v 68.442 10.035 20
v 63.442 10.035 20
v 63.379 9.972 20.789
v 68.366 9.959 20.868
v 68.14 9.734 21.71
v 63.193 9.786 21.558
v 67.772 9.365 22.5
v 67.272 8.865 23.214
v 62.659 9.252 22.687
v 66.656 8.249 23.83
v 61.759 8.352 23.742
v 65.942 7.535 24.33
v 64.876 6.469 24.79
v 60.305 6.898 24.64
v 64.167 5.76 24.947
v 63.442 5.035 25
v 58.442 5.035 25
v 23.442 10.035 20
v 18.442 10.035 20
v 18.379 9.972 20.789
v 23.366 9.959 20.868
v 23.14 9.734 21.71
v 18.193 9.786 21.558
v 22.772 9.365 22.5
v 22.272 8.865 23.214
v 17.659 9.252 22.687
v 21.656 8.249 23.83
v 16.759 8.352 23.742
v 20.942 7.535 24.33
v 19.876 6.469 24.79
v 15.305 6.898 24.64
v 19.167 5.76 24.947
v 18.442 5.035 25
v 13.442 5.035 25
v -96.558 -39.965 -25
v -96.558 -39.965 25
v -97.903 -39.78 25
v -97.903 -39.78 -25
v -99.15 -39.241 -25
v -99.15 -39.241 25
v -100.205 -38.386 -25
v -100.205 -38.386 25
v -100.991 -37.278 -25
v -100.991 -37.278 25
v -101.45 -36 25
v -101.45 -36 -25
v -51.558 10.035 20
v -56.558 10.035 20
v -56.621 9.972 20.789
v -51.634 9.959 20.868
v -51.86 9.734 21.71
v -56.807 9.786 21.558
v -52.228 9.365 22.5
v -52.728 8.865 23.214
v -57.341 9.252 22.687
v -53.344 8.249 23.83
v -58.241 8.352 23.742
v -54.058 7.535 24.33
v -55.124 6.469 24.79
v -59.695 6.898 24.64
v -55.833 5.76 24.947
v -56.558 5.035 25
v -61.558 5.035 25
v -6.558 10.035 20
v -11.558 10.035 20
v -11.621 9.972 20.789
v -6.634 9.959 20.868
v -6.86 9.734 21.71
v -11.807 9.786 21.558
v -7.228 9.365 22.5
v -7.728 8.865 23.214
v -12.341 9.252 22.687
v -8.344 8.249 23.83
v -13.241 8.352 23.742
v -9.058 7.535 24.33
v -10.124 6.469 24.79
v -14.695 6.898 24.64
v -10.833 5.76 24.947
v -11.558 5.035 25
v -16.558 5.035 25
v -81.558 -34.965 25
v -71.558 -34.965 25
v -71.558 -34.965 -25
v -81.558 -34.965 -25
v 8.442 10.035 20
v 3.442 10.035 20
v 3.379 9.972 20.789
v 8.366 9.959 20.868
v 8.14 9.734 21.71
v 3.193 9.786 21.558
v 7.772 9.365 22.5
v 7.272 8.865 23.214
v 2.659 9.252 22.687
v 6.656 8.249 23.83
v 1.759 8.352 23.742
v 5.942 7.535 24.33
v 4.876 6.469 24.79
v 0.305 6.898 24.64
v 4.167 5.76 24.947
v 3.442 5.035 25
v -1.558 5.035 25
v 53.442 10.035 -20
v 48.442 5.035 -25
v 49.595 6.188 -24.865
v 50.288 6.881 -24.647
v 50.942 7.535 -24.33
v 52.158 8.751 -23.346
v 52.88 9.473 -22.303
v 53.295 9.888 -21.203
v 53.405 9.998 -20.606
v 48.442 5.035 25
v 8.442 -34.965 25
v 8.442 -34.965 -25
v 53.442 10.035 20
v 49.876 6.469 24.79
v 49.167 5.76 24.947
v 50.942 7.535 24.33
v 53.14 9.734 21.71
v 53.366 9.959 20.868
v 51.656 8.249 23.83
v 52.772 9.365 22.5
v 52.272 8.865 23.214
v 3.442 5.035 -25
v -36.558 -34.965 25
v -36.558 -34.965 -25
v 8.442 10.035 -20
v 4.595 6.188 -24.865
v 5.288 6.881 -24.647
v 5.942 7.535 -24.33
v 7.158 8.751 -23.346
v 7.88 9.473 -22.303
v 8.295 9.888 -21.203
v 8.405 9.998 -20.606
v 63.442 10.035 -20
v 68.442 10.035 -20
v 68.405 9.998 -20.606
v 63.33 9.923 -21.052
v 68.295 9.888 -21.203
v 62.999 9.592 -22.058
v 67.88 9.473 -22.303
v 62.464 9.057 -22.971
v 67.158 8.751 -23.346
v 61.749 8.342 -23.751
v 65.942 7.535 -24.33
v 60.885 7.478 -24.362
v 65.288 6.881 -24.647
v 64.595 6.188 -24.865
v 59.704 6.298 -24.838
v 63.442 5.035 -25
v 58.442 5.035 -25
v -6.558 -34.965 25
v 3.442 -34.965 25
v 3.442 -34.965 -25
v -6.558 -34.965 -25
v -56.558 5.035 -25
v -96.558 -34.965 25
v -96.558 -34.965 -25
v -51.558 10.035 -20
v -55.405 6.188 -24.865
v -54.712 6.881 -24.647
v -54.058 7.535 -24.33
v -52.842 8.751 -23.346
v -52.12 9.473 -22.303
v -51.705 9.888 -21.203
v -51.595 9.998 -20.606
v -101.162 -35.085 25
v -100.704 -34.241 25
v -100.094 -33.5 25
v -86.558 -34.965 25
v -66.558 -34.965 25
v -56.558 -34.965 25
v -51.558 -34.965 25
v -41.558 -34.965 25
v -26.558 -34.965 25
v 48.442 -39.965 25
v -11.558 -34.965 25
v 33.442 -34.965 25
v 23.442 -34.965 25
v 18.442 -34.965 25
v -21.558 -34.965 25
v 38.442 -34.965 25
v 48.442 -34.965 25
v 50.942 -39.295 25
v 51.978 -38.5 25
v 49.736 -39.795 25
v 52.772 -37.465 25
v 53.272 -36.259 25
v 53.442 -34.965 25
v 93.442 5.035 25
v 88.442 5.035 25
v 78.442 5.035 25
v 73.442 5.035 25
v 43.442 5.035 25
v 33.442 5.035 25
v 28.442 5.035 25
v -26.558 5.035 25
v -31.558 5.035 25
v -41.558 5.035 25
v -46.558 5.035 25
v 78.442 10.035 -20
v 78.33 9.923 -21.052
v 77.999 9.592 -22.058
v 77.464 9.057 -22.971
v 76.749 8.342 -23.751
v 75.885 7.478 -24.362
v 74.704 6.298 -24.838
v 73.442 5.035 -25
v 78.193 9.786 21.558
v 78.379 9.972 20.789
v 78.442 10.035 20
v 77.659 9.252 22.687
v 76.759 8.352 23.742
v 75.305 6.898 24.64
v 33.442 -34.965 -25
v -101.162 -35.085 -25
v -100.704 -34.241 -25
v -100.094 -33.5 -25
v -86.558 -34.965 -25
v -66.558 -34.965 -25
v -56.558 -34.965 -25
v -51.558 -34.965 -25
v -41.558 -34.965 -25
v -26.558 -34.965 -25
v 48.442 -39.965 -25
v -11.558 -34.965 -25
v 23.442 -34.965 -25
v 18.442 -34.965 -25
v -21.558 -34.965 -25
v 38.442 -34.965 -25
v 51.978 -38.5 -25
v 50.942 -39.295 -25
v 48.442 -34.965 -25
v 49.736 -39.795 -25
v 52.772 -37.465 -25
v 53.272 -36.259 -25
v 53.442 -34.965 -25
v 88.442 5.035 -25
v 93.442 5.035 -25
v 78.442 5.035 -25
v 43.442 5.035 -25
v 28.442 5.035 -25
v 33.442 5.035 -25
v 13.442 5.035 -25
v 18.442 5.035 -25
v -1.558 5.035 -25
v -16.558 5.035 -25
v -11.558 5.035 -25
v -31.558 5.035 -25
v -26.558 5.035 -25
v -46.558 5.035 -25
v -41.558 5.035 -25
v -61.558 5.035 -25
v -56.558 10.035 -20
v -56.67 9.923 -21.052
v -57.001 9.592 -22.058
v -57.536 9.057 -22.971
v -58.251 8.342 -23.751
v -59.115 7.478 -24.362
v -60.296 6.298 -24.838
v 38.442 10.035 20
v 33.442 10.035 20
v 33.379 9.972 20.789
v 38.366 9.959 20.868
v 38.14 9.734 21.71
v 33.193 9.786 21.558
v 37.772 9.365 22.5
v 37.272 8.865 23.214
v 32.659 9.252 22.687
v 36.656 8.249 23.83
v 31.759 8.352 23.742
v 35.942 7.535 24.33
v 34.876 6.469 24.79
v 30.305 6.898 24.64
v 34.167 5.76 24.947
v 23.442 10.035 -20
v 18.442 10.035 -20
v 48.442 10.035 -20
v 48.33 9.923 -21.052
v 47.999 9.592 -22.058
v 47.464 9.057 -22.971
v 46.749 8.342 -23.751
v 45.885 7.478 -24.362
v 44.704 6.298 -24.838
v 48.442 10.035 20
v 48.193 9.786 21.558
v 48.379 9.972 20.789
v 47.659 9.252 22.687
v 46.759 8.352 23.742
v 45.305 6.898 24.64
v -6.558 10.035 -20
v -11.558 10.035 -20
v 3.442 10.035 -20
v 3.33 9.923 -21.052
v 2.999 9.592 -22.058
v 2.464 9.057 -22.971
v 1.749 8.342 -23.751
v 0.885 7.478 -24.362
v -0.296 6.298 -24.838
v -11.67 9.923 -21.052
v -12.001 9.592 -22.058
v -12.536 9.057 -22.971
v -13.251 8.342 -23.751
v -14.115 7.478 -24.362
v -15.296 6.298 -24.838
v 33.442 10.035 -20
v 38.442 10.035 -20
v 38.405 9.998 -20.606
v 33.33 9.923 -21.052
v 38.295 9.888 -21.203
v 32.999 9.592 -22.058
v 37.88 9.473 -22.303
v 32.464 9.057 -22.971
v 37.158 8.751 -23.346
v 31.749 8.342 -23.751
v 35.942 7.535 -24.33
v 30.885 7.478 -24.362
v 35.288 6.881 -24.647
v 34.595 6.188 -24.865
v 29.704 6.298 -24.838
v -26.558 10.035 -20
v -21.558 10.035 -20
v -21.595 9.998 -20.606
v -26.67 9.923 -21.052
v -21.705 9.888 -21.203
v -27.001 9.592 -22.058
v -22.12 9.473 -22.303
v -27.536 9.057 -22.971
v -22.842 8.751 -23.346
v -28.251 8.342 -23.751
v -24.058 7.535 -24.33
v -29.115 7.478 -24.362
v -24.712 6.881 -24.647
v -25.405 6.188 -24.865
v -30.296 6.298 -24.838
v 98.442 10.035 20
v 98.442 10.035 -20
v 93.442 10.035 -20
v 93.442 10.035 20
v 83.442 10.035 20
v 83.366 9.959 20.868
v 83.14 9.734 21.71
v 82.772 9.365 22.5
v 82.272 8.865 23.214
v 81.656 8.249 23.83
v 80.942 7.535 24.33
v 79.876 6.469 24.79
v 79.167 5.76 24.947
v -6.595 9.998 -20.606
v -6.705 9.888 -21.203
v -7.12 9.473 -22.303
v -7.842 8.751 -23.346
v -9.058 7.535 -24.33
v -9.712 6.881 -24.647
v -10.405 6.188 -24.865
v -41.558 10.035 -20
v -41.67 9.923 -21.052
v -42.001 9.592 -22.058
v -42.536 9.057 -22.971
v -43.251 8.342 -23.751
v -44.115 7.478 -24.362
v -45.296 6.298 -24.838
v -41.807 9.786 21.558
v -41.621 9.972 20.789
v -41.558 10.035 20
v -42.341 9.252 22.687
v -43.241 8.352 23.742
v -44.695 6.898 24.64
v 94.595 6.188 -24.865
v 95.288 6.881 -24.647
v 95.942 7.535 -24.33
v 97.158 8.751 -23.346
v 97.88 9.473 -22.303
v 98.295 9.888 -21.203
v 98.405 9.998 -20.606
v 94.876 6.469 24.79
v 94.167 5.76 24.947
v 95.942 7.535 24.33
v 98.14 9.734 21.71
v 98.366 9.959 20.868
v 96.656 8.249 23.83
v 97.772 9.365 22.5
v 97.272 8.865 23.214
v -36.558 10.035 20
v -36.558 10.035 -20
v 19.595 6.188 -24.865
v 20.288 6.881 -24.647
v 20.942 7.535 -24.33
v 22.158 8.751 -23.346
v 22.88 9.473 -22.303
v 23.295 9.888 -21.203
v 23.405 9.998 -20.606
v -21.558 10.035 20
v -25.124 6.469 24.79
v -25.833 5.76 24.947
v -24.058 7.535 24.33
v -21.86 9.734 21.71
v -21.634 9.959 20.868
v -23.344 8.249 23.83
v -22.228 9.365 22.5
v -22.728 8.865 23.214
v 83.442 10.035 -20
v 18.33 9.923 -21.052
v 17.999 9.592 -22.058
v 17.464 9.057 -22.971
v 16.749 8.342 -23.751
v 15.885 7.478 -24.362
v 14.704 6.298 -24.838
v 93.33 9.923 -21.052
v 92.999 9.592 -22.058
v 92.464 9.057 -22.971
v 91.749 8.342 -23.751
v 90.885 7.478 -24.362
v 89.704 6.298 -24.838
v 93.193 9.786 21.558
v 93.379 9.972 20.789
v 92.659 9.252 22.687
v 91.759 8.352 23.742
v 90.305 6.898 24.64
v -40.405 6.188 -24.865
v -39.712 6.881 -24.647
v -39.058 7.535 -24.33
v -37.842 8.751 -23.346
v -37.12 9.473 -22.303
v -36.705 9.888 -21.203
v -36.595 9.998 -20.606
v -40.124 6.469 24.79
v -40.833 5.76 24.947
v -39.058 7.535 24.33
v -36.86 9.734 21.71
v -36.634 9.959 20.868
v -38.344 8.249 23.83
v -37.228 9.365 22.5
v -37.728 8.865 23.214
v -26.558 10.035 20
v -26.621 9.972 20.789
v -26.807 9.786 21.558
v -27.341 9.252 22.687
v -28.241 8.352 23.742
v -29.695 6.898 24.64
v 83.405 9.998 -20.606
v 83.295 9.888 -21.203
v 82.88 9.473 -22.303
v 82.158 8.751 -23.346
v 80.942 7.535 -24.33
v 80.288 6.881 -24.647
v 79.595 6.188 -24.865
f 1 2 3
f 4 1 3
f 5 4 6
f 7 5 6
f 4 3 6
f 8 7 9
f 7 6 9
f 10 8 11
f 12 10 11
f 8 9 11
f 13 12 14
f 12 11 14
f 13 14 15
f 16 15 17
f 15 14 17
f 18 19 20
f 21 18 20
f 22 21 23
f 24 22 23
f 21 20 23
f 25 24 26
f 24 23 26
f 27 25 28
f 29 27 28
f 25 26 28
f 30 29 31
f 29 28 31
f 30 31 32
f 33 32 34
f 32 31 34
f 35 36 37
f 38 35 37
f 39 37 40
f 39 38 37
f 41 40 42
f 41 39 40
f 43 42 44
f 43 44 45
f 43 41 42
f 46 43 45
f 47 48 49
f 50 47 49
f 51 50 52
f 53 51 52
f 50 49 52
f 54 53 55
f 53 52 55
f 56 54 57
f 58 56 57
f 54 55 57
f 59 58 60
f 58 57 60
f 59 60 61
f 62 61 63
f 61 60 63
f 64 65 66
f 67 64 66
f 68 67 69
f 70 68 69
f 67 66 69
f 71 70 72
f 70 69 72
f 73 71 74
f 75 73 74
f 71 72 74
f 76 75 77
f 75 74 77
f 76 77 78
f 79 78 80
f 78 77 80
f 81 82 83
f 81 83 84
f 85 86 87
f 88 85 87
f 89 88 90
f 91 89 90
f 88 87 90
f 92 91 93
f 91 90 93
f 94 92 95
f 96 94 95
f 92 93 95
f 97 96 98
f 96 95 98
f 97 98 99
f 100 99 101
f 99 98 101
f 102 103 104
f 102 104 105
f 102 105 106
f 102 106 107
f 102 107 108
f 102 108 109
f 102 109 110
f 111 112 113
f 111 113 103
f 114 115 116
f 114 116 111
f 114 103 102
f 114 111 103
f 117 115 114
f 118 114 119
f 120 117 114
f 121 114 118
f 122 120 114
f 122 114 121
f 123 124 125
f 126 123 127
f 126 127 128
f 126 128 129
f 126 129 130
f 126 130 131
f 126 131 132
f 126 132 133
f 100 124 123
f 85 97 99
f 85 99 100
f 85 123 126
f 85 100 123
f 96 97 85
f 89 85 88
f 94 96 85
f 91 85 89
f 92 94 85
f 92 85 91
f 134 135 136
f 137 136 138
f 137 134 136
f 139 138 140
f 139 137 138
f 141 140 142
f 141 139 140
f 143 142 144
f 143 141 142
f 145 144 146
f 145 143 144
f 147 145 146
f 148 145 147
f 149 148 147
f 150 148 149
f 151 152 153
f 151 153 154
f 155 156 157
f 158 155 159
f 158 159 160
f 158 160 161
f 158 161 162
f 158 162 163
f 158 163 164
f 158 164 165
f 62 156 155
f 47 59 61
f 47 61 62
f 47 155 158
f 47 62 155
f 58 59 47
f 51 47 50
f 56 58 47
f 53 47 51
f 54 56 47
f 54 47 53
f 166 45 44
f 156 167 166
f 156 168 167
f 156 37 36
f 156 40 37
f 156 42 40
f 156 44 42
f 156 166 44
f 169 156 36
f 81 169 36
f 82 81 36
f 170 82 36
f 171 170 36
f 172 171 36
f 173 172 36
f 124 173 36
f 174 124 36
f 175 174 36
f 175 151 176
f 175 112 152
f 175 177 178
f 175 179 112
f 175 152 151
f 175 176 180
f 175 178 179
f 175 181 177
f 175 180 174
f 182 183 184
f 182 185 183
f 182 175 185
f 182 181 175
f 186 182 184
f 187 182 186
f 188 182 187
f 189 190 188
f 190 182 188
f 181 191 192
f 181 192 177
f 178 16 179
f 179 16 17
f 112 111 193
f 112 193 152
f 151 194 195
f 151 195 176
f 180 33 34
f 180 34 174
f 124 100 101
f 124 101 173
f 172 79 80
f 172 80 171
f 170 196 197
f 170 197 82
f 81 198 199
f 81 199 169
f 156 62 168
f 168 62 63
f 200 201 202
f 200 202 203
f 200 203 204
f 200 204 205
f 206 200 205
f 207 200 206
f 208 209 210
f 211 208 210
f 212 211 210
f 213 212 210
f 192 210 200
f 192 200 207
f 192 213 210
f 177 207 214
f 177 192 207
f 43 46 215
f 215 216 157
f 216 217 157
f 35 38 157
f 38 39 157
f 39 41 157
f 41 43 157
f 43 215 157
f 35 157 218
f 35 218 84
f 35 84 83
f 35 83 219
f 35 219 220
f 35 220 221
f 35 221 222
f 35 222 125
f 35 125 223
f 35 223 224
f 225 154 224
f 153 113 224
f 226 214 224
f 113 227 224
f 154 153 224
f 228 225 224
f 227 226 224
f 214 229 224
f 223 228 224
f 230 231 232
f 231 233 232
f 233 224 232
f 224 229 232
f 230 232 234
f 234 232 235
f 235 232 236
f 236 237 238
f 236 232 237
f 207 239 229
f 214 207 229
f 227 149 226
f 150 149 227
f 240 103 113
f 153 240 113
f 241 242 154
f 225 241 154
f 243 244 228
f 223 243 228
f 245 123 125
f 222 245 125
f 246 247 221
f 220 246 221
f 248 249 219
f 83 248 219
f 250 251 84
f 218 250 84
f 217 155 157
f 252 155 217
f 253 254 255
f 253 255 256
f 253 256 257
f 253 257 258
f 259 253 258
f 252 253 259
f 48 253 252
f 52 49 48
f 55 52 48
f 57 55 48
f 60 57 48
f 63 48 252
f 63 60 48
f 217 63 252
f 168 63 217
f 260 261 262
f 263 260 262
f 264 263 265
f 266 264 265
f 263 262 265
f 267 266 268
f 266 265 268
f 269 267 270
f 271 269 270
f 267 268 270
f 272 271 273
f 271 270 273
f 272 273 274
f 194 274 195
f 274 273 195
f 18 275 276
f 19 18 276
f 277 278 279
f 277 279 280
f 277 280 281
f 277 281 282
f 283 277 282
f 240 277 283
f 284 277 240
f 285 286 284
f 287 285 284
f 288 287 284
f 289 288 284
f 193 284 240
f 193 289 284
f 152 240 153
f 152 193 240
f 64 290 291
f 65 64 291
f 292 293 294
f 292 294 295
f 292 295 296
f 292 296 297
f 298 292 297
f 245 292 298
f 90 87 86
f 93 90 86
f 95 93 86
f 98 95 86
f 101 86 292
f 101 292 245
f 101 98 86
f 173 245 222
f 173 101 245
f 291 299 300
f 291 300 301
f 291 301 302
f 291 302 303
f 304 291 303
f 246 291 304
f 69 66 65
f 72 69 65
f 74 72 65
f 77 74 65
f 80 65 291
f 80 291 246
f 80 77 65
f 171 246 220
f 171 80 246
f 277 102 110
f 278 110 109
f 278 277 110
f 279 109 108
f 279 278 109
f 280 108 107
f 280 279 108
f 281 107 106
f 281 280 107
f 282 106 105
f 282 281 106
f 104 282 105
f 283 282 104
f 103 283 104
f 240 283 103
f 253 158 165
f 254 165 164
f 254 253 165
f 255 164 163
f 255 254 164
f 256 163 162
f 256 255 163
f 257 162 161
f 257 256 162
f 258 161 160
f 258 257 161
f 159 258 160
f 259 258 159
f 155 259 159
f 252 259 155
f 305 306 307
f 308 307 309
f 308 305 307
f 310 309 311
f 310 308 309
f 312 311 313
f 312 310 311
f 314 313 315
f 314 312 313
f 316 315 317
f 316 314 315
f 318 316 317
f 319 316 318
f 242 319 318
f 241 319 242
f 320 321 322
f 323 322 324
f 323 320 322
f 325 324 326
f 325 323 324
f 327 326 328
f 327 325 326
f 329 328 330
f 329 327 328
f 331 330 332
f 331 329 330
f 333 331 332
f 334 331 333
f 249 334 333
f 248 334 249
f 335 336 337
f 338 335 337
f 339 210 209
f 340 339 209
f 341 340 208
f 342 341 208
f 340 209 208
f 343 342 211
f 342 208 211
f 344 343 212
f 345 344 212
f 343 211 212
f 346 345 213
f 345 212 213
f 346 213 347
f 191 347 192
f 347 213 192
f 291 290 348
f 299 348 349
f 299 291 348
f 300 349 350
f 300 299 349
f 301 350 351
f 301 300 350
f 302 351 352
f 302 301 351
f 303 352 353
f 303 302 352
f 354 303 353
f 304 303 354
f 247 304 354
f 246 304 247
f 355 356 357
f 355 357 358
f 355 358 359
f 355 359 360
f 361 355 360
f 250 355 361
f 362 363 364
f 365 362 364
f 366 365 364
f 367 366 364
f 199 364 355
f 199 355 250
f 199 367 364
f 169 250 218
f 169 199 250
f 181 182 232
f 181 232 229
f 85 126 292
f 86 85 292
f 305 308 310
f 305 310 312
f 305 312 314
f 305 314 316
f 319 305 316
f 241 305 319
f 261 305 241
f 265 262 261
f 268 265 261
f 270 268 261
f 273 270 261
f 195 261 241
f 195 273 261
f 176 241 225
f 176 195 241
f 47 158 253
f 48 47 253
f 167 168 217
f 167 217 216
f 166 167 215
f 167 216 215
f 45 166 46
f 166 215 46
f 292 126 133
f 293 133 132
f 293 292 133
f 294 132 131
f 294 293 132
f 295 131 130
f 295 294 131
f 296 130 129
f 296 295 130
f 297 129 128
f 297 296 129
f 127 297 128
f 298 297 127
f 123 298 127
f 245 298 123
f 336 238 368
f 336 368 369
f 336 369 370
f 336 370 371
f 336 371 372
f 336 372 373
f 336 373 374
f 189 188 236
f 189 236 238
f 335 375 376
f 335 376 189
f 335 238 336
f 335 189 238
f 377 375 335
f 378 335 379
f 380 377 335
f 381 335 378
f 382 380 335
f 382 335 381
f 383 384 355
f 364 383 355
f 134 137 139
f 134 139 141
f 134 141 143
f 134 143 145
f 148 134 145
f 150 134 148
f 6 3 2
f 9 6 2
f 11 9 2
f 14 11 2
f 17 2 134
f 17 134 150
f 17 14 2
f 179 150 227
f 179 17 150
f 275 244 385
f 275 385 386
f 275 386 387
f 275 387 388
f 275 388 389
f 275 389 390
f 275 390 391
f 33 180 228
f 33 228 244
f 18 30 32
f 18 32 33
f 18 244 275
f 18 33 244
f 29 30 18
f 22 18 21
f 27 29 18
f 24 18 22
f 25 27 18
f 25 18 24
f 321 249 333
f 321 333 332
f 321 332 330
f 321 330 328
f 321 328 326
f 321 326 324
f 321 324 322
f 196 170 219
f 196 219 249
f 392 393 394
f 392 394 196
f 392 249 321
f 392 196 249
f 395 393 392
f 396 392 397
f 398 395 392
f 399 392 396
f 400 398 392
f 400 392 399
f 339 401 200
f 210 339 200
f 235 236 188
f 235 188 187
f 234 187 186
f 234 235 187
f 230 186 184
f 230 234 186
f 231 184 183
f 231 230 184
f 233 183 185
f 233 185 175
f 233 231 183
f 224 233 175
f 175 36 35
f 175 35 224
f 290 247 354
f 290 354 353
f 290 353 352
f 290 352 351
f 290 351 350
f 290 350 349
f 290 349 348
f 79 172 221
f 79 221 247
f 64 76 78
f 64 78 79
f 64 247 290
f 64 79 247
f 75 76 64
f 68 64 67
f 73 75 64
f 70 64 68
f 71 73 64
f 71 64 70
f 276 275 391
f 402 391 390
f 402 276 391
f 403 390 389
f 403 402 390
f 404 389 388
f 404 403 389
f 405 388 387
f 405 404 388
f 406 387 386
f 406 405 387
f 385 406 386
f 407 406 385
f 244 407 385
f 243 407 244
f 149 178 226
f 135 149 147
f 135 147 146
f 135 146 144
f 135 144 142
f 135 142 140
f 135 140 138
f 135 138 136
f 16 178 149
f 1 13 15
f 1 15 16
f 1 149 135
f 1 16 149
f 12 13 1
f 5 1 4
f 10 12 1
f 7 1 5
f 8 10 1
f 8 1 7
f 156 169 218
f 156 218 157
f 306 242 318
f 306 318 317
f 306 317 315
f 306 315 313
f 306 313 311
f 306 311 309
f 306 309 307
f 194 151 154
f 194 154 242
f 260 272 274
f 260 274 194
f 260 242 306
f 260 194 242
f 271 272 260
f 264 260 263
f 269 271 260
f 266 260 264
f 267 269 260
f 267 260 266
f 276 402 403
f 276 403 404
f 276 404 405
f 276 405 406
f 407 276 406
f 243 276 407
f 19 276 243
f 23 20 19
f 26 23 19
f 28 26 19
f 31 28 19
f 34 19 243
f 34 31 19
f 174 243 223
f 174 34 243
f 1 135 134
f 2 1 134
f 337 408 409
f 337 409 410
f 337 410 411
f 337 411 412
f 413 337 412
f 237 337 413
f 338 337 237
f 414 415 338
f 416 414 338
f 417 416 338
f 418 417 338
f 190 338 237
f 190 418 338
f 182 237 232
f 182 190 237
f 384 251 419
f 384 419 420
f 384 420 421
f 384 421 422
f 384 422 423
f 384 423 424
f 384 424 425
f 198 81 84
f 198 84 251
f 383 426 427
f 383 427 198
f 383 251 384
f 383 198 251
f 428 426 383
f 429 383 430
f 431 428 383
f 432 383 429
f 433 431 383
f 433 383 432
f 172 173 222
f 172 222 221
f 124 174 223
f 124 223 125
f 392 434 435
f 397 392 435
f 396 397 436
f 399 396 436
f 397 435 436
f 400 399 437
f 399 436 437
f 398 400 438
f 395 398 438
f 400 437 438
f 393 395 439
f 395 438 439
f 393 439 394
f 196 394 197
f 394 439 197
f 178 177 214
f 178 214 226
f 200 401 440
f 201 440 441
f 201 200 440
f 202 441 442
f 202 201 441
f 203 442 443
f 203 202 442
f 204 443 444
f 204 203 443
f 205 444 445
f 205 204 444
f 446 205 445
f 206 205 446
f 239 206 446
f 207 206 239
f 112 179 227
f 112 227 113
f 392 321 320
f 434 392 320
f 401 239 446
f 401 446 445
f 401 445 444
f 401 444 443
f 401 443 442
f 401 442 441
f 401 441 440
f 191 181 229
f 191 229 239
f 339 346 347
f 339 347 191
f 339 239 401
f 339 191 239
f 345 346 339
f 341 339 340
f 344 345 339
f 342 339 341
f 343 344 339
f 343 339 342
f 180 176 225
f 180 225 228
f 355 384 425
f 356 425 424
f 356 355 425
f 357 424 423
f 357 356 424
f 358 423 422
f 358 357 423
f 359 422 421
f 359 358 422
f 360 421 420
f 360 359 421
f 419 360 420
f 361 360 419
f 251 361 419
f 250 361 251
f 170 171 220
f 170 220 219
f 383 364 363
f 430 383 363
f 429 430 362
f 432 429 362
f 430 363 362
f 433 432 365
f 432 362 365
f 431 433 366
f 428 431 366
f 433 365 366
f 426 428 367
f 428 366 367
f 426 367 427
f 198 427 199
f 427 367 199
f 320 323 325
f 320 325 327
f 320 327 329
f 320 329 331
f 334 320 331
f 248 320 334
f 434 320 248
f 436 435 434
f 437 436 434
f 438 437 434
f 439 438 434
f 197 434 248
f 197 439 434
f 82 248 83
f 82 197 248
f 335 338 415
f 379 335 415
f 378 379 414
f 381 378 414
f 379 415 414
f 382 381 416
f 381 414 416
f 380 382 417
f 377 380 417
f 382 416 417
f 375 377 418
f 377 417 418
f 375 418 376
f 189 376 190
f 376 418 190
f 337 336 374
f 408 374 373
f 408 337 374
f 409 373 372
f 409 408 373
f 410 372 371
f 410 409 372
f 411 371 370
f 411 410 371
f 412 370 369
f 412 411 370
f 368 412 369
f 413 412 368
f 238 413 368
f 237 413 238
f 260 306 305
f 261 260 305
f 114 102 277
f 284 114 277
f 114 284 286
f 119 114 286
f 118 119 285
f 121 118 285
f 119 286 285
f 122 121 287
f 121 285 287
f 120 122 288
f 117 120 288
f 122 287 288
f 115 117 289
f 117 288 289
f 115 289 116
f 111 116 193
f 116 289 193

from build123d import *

# Parameters (mm, degrees)
F1_DEPTH     = 25
F2_T1_DEPTH  = 30
F2_T3_DEPTH  = 30
F2_T5_DEPTH  = 30
F2_T7_DEPTH  = 30
F2_T9_DEPTH  = 30
F2_T11_DEPTH = 30
F2_T13_DEPTH = 30
F2_T15_DEPTH = 30
F2_T17_DEPTH = 30
F2_T19_DEPTH = 30
F2_T21_DEPTH = 30
F2_T23_DEPTH = 60.3553390593
F2_T25_DEPTH = 75


# Not quite as in the source:
# - a fillet or chamfer that OpenCascade refuses, or shapes differently, is made with other operations: its cross-section is extruded or revolved along the edge and cut away or added


with BuildPart() as f1:
    # F0 (on Top) → F1 (new body, symmetric)
    with BuildSketch(Plane.XY):
        Polygon((-56.5580020845, 10.0351088219), (-69.7381969311, -3.1450860247), (-101.5580020845, -34.9648911781), (-96.5580020845, -34.9648911781), (-51.5580020845, 10.0351088219), align=None)
        Polygon((-96.5580020845, -34.9648911781), (-101.5580020845, -34.9648911781), (-101.5580020845, -39.9648911781), (53.4419979155, -39.9648911781), (53.4419979155, -34.9648911781), (48.4419979155, -34.9648911781), (38.4419979155, -34.9648911781), (33.4419979155, -34.9648911781), (23.4419979155, -34.9648911781), (18.4419979155, -34.9648911781), (8.4419979155, -34.9648911781), (3.4419979155, -34.9648911781), (-6.5580020845, -34.9648911781), (-11.5580020845, -34.9648911781), (-21.5580020845, -34.9648911781), (-26.5580020845, -34.9648911781), (-36.5580020845, -34.9648911781), (-41.5580020845, -34.9648911781), (-51.5580020845, -34.9648911781), (-56.5580020845, -34.9648911781), (-66.5580020845, -34.9648911781), (-71.5580020845, -34.9648911781), (-81.5580020845, -34.9648911781), (-86.5580020845, -34.9648911781), align=None)
        Polygon((-41.5580020845, 10.0351088219), (-86.5580020845, -34.9648911781), (-81.5580020845, -34.9648911781), (-36.5580020845, 10.0351088219), align=None)
        Polygon((48.4419979155, -34.9648911781), (53.4419979155, -34.9648911781), (98.4419979155, 10.0351088219), (93.4419979155, 10.0351088219), align=None)
        Polygon((-26.5580020845, 10.0351088219), (-71.5580020845, -34.9648911781), (-66.5580020845, -34.9648911781), (-21.5580020845, 10.0351088219), align=None)
        Polygon((33.4419979155, -34.9648911781), (38.4419979155, -34.9648911781), (83.4419979155, 10.0351088219), (78.4419979155, 10.0351088219), align=None)
        Polygon((-11.5580020845, 10.0351088219), (-56.5580020845, -34.9648911781), (-51.5580020845, -34.9648911781), (-6.5580020845, 10.0351088219), align=None)
        Polygon((18.4419979155, -34.9648911781), (23.4419979155, -34.9648911781), (68.4419979155, 10.0351088219), (63.4419979155, 10.0351088219), align=None)
        Polygon((3.4419979155, 10.0351088219), (-41.5580020845, -34.9648911781), (-36.5580020845, -34.9648911781), (8.4419979155, 10.0351088219), align=None)
        Polygon((3.4419979155, -34.9648911781), (8.4419979155, -34.9648911781), (53.4419979155, 10.0351088219), (48.4419979155, 10.0351088219), align=None)
        Polygon((18.4419979155, 10.0351088219), (-26.5580020845, -34.9648911781), (-21.5580020845, -34.9648911781), (23.4419979155, 10.0351088219), align=None)
        Polygon((-11.5580020845, -34.9648911781), (-6.5580020845, -34.9648911781), (38.4419979155, 10.0351088219), (33.4419979155, 10.0351088219), align=None)
    extrude(amount=F1_DEPTH, both=True)

    # F2: fillet of radius 5 on 25 edges, made by hand

    # F2_s2 → F2_t1 (cut)
    with BuildSketch(Plane.YZ.offset(-69.0580020845)):
        with BuildLine():
            ThreePointArc((10.0351088219, -20), (8.5706427278, -23.5355339059), (5.0351088219, -25))
            Line((5.0351088219, -25), (10.0351088219, -25))
            Line((10.0351088219, -25), (10.0351088219, -20))
        make_face()
        with BuildLine():
            ThreePointArc((10.0351088219, 20), (8.5706427278, 23.5355339059), (5.0351088219, 25))
            Line((5.0351088219, 25), (10.0351088219, 25))
            Line((10.0351088219, 25), (10.0351088219, 20))
        make_face()
    extrude(amount=F2_T1_DEPTH, mode=Mode.SUBTRACT)

    # F2_s4 → F2_t3 (cut)
    with BuildSketch(Plane.YZ.offset(-54.0580020845)):
        with BuildLine():
            ThreePointArc((10.0351088219, 20), (8.5706427278, 23.5355339059), (5.0351088219, 25))
            Line((5.0351088219, 25), (10.0351088219, 25))
            Line((10.0351088219, 25), (10.0351088219, 20))
        make_face()
        with BuildLine():
            ThreePointArc((10.0351088219, -20), (8.5706427278, -23.5355339059), (5.0351088219, -25))
            Line((5.0351088219, -25), (10.0351088219, -25))
            Line((10.0351088219, -25), (10.0351088219, -20))
        make_face()
    extrude(amount=F2_T3_DEPTH, mode=Mode.SUBTRACT)

    # F2_s6 → F2_t5 (cut)
    with BuildSketch(Plane.YZ.offset(-39.0580020845)):
        with BuildLine():
            ThreePointArc((10.0351088219, -20), (8.5706427278, -23.5355339059), (5.0351088219, -25))
            Line((5.0351088219, -25), (10.0351088219, -25))
            Line((10.0351088219, -25), (10.0351088219, -20))
        make_face()
        with BuildLine():
            ThreePointArc((10.0351088219, 20), (8.5706427278, 23.5355339059), (5.0351088219, 25))
            Line((5.0351088219, 25), (10.0351088219, 25))
            Line((10.0351088219, 25), (10.0351088219, 20))
        make_face()
    extrude(amount=F2_T5_DEPTH, mode=Mode.SUBTRACT)

    # F2_s8 → F2_t7 (cut)
    with BuildSketch(Plane.YZ.offset(-24.0580020845)):
        with BuildLine():
            ThreePointArc((10.0351088219, 20), (8.5706427278, 23.5355339059), (5.0351088219, 25))
            Line((5.0351088219, 25), (10.0351088219, 25))
            Line((10.0351088219, 25), (10.0351088219, 20))
        make_face()
        with BuildLine():
            ThreePointArc((10.0351088219, -20), (8.5706427278, -23.5355339059), (5.0351088219, -25))
            Line((5.0351088219, -25), (10.0351088219, -25))
            Line((10.0351088219, -25), (10.0351088219, -20))
        make_face()
    extrude(amount=F2_T7_DEPTH, mode=Mode.SUBTRACT)

    # F2_s10 → F2_t9 (cut)
    with BuildSketch(Plane.YZ.offset(-9.0580020845)):
        with BuildLine():
            ThreePointArc((10.0351088219, 20), (8.5706427278, 23.5355339059), (5.0351088219, 25))
            Line((5.0351088219, 25), (10.0351088219, 25))
            Line((10.0351088219, 25), (10.0351088219, 20))
        make_face()
        with BuildLine():
            ThreePointArc((10.0351088219, -20), (8.5706427278, -23.5355339059), (5.0351088219, -25))
            Line((5.0351088219, -25), (10.0351088219, -25))
            Line((10.0351088219, -25), (10.0351088219, -20))
        make_face()
    extrude(amount=F2_T9_DEPTH, mode=Mode.SUBTRACT)

    # F2_s12 → F2_t11 (cut)
    with BuildSketch(Plane.YZ.offset(5.9419979155)):
        with BuildLine():
            ThreePointArc((10.0351088219, -20), (8.5706427278, -23.5355339059), (5.0351088219, -25))
            Line((5.0351088219, -25), (10.0351088219, -25))
            Line((10.0351088219, -25), (10.0351088219, -20))
        make_face()
        with BuildLine():
            ThreePointArc((10.0351088219, 20), (8.5706427278, 23.5355339059), (5.0351088219, 25))
            Line((5.0351088219, 25), (10.0351088219, 25))
            Line((10.0351088219, 25), (10.0351088219, 20))
        make_face()
    extrude(amount=F2_T11_DEPTH, mode=Mode.SUBTRACT)

    # F2_s14 → F2_t13 (cut)
    with BuildSketch(Plane.YZ.offset(20.9419979155)):
        with BuildLine():
            ThreePointArc((10.0351088219, 20), (8.5706427278, 23.5355339059), (5.0351088219, 25))
            Line((5.0351088219, 25), (10.0351088219, 25))
            Line((10.0351088219, 25), (10.0351088219, 20))
        make_face()
        with BuildLine():
            ThreePointArc((10.0351088219, -20), (8.5706427278, -23.5355339059), (5.0351088219, -25))
            Line((5.0351088219, -25), (10.0351088219, -25))
            Line((10.0351088219, -25), (10.0351088219, -20))
        make_face()
    extrude(amount=F2_T13_DEPTH, mode=Mode.SUBTRACT)

    # F2_s16 → F2_t15 (cut)
    with BuildSketch(Plane.YZ.offset(35.9419979155)):
        with BuildLine():
            ThreePointArc((10.0351088219, 20), (8.5706427278, 23.5355339059), (5.0351088219, 25))
            Line((5.0351088219, 25), (10.0351088219, 25))
            Line((10.0351088219, 25), (10.0351088219, 20))
        make_face()
        with BuildLine():
            ThreePointArc((10.0351088219, -20), (8.5706427278, -23.5355339059), (5.0351088219, -25))
            Line((5.0351088219, -25), (10.0351088219, -25))
            Line((10.0351088219, -25), (10.0351088219, -20))
        make_face()
    extrude(amount=F2_T15_DEPTH, mode=Mode.SUBTRACT)

    # F2_s18 → F2_t17 (cut)
    with BuildSketch(Plane.YZ.offset(50.9419979155)):
        with BuildLine():
            ThreePointArc((10.0351088219, 20), (8.5706427278, 23.5355339059), (5.0351088219, 25))
            Line((5.0351088219, 25), (10.0351088219, 25))
            Line((10.0351088219, 25), (10.0351088219, 20))
        make_face()
        with BuildLine():
            ThreePointArc((10.0351088219, -20), (8.5706427278, -23.5355339059), (5.0351088219, -25))
            Line((5.0351088219, -25), (10.0351088219, -25))
            Line((10.0351088219, -25), (10.0351088219, -20))
        make_face()
    extrude(amount=F2_T17_DEPTH, mode=Mode.SUBTRACT)

    # F2_s20 → F2_t19 (cut)
    with BuildSketch(Plane.YZ.offset(65.9419979155)):
        with BuildLine():
            ThreePointArc((10.0351088219, 20), (8.5706427278, 23.5355339059), (5.0351088219, 25))
            Line((5.0351088219, 25), (10.0351088219, 25))
            Line((10.0351088219, 25), (10.0351088219, 20))
        make_face()
        with BuildLine():
            ThreePointArc((10.0351088219, -20), (8.5706427278, -23.5355339059), (5.0351088219, -25))
            Line((5.0351088219, -25), (10.0351088219, -25))
            Line((10.0351088219, -25), (10.0351088219, -20))
        make_face()
    extrude(amount=F2_T19_DEPTH, mode=Mode.SUBTRACT)

    # F2_s22 → F2_t21 (cut)
    with BuildSketch(Plane.YZ.offset(80.9419979155)):
        with BuildLine():
            ThreePointArc((10.0351088219, 20), (8.5706427278, 23.5355339059), (5.0351088219, 25))
            Line((5.0351088219, 25), (10.0351088219, 25))
            Line((10.0351088219, 25), (10.0351088219, 20))
        make_face()
        with BuildLine():
            ThreePointArc((10.0351088219, -20), (8.5706427278, -23.5355339059), (5.0351088219, -25))
            Line((5.0351088219, -25), (10.0351088219, -25))
            Line((10.0351088219, -25), (10.0351088219, -20))
        make_face()
    extrude(amount=F2_T21_DEPTH, mode=Mode.SUBTRACT)

    # F2_s24 → F2_t23 (cut)
    with BuildSketch(Plane.XY.offset(-30.1776695297)):
        with BuildLine():
            ThreePointArc((-100.0935359904, -33.5004250841), (-101.1773997471, -35.1225418282), (-101.5580020845, -37.03595899))
            Line((-101.5580020845, -37.03595899), (-101.5580020845, -34.9648911781))
            Line((-101.5580020845, -34.9648911781), (-100.0935359904, -33.5004250841))
        make_face()
    extrude(amount=F2_T23_DEPTH, mode=Mode.SUBTRACT)

    # F2_s26 → F2_t25 (cut)
    with BuildSketch(Plane.XY.offset(-37.5)):
        with BuildLine():
            ThreePointArc((-96.5580020845, -39.9648911781), (-100.0935359904, -38.5004250841), (-101.5580020845, -34.9648911781))
            Line((-101.5580020845, -34.9648911781), (-101.5580020845, -39.9648911781))
            Line((-101.5580020845, -39.9648911781), (-96.5580020845, -39.9648911781))
        make_face()
        with BuildLine():
            ThreePointArc((53.4419979155, -34.9648911781), (51.9775318214, -38.5004250841), (48.4419979155, -39.9648911781))
            Line((48.4419979155, -39.9648911781), (53.4419979155, -39.9648911781))
            Line((53.4419979155, -39.9648911781), (53.4419979155, -34.9648911781))
        make_face()
    extrude(amount=F2_T25_DEPTH, mode=Mode.SUBTRACT)


solid = f1.part
